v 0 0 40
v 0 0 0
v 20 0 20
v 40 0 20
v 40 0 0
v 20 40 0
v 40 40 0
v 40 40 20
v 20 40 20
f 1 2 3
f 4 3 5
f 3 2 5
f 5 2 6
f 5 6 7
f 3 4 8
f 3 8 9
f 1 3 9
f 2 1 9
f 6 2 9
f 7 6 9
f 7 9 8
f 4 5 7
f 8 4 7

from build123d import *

# Parameters (mm, degrees)
SKETCH1_W           = 40
SKETCH1_H           = 40
BOSS_EXTRUDE1_DEPTH = 40
CUT_EXTRUDE1_DEPTH  = 40
CUT_EXTRUDE2_DEPTH  = 40


with BuildPart() as part:
    # Sketch1 → Boss-Extrude1 (new body)
    with BuildSketch(Plane.XY):
        with Locations((20, 20)):
            Rectangle(SKETCH1_W, SKETCH1_H)
    extrude(amount=BOSS_EXTRUDE1_DEPTH)

    # Sketch2 → Cut-Extrude1 (cut)
    with BuildSketch(Plane.XY.offset(40)):
        Polygon((0, 0), (20, 40), (0, 40), align=None)
    extrude(amount=-CUT_EXTRUDE1_DEPTH, mode=Mode.SUBTRACT)

    # Sketch3 → Cut-Extrude2 (cut)
    with BuildSketch(Plane.XZ):
        Polygon((40, 20), (20, 20), (0, 40), (40, 40), align=None)
    extrude(amount=-CUT_EXTRUDE2_DEPTH, mode=Mode.SUBTRACT)


solid = part.part
